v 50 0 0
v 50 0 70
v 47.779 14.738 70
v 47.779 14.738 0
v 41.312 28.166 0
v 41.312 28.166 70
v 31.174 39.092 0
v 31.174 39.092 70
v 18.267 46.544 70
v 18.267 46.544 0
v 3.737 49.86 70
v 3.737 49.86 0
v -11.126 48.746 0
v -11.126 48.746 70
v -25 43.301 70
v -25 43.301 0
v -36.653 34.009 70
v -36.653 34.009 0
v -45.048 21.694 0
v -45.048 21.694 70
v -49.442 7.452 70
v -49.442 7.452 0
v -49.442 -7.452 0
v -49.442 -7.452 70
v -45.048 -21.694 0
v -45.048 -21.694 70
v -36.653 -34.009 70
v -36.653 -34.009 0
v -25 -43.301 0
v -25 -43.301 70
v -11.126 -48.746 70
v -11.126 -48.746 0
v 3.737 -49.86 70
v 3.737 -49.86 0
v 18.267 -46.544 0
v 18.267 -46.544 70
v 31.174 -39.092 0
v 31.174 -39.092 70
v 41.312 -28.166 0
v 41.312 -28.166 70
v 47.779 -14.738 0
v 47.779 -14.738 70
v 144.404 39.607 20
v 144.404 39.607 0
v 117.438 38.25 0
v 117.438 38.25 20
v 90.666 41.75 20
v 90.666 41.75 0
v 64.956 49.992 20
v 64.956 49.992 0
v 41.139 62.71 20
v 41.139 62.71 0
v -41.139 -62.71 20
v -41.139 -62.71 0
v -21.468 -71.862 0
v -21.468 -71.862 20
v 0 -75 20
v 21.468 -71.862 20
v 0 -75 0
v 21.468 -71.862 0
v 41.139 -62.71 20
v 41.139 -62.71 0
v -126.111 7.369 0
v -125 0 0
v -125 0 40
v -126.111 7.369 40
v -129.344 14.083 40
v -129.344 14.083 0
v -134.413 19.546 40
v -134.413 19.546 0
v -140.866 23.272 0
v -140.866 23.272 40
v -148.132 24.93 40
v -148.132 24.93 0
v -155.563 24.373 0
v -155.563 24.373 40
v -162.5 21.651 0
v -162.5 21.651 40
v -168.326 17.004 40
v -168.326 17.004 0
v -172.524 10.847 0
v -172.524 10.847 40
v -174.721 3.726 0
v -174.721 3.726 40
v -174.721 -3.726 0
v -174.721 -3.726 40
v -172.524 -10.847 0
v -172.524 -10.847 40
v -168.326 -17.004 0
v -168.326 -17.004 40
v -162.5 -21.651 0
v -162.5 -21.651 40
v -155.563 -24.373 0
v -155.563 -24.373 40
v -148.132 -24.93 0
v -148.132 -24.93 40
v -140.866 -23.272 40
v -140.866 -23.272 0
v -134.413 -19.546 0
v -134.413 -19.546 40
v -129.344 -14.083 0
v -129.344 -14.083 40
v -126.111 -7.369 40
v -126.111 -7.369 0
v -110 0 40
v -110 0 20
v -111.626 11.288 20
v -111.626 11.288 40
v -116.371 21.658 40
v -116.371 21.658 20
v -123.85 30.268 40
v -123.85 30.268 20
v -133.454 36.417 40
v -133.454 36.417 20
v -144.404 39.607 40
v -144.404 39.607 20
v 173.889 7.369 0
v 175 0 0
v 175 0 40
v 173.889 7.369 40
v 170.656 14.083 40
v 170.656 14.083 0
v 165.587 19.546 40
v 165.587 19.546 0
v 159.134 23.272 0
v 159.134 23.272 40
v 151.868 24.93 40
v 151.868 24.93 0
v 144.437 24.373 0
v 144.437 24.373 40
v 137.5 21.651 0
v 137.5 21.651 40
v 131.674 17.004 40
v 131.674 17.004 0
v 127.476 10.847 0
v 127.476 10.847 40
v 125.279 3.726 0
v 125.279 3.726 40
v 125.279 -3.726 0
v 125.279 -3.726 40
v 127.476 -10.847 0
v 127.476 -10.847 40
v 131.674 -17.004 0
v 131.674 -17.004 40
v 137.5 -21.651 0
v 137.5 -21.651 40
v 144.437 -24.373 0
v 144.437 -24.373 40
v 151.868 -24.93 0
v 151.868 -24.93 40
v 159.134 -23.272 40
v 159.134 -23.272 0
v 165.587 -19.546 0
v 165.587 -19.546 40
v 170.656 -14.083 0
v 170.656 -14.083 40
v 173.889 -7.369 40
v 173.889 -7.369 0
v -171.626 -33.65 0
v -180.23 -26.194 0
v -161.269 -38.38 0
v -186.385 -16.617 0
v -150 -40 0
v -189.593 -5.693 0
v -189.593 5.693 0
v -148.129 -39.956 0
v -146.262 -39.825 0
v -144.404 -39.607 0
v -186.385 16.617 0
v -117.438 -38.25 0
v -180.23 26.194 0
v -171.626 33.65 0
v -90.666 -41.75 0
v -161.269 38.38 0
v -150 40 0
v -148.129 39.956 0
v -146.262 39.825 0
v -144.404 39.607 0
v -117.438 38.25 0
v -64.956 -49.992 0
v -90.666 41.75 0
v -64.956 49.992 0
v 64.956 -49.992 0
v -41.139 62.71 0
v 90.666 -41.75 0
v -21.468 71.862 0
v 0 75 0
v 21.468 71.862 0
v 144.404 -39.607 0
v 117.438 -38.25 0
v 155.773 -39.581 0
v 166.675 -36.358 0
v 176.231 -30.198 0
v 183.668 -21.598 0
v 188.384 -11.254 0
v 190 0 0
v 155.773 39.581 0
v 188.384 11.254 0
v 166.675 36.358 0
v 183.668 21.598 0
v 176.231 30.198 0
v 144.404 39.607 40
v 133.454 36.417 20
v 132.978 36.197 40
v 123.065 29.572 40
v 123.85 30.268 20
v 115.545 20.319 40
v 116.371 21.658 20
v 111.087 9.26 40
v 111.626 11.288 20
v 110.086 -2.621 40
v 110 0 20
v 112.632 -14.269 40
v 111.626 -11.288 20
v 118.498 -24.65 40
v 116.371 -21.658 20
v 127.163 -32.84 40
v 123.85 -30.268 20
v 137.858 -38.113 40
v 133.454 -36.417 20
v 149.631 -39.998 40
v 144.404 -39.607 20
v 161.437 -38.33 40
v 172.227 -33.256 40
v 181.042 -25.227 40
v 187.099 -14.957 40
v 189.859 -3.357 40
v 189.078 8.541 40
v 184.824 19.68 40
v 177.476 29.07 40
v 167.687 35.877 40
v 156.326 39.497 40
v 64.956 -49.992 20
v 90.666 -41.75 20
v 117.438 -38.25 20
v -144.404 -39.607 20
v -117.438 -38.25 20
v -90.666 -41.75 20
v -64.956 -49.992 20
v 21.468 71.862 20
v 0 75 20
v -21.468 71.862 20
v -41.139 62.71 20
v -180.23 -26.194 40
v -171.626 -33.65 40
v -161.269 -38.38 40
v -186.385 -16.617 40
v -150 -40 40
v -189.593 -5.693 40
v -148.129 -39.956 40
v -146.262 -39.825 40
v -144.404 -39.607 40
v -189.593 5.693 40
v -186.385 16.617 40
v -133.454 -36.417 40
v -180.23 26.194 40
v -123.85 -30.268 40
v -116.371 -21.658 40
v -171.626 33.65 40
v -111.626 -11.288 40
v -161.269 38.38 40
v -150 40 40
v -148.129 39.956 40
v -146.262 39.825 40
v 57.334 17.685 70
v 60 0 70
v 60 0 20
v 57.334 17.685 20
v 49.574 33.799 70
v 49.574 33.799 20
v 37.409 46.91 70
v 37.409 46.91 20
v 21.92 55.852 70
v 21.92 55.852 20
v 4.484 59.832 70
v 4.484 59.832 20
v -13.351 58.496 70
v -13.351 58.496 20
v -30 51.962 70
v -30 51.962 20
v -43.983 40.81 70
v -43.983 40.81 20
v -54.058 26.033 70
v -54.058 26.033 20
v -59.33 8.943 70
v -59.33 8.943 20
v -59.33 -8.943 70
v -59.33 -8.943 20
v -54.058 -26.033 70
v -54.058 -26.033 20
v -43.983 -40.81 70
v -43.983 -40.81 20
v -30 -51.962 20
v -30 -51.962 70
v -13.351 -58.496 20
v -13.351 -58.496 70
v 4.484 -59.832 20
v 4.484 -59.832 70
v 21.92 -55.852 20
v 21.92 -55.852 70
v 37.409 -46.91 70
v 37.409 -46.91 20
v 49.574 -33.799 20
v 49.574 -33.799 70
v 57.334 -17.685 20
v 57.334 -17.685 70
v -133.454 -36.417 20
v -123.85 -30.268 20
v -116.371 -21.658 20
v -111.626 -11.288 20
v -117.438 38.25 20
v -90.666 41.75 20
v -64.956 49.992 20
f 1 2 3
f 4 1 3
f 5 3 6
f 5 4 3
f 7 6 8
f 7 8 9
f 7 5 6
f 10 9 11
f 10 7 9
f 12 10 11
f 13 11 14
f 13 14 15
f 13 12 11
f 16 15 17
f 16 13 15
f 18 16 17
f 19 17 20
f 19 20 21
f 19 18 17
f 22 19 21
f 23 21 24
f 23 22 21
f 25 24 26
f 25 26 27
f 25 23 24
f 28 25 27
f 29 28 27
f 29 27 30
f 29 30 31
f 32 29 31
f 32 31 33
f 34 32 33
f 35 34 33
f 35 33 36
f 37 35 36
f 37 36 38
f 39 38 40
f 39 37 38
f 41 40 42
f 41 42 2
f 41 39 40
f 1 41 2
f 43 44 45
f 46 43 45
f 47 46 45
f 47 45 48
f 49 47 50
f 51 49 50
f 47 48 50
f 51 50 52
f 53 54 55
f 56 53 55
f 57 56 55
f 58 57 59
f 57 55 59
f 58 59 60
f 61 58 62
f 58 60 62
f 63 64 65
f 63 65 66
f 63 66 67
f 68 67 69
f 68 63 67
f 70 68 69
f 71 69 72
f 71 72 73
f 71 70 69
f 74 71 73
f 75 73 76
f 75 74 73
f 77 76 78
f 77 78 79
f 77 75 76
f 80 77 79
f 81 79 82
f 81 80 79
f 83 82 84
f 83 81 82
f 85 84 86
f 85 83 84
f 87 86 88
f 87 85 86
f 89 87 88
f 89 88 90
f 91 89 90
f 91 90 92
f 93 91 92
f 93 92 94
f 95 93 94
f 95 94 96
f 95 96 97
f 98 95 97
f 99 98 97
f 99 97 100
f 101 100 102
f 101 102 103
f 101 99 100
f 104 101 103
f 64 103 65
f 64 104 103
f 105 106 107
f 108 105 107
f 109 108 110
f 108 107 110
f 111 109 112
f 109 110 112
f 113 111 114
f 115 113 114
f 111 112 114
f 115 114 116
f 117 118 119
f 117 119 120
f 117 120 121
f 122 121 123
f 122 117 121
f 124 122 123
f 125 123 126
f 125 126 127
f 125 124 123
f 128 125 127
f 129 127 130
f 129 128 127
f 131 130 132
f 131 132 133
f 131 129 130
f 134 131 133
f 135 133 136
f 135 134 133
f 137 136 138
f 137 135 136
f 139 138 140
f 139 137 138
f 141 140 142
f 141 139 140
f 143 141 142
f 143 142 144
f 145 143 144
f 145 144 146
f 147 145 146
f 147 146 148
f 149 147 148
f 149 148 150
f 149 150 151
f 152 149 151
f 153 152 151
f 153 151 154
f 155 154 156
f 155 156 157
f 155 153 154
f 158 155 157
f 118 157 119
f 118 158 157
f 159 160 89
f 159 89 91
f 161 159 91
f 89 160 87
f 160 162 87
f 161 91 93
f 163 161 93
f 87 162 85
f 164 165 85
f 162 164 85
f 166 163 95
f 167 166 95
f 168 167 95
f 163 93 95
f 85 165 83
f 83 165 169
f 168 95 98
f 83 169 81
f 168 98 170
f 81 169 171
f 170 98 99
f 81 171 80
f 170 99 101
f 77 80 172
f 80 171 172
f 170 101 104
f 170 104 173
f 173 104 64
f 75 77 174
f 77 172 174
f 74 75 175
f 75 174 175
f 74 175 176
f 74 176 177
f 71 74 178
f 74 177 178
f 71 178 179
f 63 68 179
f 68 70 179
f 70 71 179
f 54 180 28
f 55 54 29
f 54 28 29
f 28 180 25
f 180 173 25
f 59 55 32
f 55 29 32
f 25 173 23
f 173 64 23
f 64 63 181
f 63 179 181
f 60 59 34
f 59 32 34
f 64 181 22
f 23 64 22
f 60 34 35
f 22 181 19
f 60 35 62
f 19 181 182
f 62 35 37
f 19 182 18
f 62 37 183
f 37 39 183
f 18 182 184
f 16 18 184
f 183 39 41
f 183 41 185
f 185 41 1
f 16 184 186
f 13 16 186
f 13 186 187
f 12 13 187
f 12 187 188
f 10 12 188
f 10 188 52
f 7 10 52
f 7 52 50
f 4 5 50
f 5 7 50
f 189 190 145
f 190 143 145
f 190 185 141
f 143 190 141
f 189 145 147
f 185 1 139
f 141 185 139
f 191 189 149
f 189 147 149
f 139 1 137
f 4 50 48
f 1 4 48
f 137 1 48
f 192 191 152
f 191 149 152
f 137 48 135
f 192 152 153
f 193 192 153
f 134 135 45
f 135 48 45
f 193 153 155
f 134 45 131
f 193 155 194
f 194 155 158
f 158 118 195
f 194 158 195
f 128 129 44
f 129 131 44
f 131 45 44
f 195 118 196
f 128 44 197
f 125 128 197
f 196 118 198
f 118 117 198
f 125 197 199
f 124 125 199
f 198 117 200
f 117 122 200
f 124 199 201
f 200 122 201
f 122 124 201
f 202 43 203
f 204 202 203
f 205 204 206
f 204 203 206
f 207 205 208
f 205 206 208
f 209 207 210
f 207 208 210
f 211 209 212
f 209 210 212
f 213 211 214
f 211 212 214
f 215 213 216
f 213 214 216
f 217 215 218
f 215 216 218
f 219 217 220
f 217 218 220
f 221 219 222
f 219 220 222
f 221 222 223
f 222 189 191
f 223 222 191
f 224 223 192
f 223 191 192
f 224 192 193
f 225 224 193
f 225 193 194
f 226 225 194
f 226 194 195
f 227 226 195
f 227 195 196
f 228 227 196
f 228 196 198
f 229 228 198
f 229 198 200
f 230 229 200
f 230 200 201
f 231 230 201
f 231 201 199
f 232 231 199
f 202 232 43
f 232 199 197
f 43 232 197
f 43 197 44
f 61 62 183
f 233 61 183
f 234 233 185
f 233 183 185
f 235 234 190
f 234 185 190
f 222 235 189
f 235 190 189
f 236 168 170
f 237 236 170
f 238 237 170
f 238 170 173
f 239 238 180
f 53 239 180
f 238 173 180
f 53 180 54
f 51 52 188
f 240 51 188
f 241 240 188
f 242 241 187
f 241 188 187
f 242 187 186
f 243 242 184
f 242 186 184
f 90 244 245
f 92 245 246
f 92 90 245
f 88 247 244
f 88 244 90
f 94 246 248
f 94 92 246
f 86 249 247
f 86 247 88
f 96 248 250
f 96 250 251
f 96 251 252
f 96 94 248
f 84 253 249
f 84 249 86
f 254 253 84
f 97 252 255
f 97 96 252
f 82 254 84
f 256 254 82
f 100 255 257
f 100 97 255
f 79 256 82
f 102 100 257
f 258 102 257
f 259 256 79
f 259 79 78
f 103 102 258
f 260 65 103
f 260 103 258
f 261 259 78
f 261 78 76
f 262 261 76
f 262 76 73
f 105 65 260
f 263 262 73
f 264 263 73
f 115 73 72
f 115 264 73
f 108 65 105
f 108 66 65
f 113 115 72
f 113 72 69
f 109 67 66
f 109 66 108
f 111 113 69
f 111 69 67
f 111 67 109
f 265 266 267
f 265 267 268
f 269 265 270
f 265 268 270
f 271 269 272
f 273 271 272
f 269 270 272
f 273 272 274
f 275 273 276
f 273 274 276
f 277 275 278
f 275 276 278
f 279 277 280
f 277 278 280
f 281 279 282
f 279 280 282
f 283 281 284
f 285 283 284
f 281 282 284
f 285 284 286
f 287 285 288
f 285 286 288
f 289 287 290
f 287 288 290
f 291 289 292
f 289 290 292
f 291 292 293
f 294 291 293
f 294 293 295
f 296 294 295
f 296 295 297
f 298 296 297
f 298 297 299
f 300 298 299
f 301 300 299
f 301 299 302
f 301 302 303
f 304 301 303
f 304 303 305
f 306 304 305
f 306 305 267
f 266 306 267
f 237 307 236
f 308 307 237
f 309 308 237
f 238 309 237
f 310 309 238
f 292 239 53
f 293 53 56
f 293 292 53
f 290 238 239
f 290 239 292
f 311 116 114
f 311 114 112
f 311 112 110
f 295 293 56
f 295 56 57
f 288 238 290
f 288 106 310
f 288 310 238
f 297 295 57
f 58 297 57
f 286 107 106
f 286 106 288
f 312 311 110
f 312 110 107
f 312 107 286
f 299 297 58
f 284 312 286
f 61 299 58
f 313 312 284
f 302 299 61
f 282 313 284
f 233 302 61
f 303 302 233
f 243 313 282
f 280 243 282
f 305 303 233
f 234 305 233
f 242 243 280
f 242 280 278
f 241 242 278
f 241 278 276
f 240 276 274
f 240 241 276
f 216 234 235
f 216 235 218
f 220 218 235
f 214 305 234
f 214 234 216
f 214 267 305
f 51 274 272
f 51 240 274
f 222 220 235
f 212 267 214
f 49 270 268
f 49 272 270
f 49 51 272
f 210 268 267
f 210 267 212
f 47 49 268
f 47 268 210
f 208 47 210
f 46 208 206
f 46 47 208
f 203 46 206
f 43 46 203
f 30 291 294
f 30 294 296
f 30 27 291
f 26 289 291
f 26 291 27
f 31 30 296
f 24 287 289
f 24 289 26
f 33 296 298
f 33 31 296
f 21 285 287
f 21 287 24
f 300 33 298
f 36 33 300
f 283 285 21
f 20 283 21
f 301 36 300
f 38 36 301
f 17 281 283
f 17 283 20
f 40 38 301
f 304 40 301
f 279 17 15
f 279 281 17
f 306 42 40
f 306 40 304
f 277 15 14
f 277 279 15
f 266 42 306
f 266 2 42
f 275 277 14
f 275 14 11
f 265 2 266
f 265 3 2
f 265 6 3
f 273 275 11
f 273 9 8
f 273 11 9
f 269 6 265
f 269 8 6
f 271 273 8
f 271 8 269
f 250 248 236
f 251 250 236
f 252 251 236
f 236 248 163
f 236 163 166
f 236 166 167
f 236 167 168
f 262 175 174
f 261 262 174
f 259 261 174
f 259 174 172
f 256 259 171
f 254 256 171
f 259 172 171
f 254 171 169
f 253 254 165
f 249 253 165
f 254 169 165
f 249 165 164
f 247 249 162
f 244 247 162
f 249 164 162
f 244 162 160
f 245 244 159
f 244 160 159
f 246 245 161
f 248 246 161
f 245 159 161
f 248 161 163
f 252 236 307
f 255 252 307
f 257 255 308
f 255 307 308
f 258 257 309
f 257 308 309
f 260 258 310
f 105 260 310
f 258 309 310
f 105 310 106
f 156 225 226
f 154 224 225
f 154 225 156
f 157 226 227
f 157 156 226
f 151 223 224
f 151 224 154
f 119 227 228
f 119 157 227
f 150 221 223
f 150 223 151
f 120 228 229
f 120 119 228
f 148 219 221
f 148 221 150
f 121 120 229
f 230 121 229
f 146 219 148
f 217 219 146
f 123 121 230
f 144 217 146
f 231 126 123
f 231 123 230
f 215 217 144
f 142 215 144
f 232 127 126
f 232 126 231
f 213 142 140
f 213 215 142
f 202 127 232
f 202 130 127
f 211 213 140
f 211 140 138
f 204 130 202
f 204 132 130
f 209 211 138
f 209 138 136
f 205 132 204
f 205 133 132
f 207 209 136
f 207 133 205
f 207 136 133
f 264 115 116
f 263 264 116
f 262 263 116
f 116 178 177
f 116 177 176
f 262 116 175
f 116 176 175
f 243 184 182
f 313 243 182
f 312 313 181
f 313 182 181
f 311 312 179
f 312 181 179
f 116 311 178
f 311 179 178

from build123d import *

# Parameters (mm, degrees)
SKETCH1_R           = 60
BOSS_EXTRUDE1_DEPTH = 20
SKETCH1_3_R         = 60
SKETCH1_3_R_2       = 50
BOSS_EXTRUDE2_DEPTH = 70
SKETCH1_5_R         = 40
SKETCH1_5_R_2       = 25
BOSS_EXTRUDE3_DEPTH = 40


with BuildPart() as part:
    # Sketch1 → Boss-Extrude1 (new body)
    with BuildSketch(Plane.XY):
        with BuildLine():
            ThreePointArc((-144.403508772, -39.606556098), (-90.666225841, -41.750102304), (-41.138888889, -62.710380488))
            ThreePointArc((-41.138888889, -62.710380488), (0, -75), (41.138888889, -62.710380488))
            ThreePointArc((41.138888889, -62.710380488), (90.666225841, -41.750102304), (144.403508772, -39.606556098))
            ThreePointArc((144.403508772, -39.606556098), (110, 0), (144.403508772, 39.606556098))
            ThreePointArc((144.403508772, 39.606556098), (90.666225841, 41.750102304), (41.138888889, 62.710380488))
            ThreePointArc((41.138888889, 62.710380488), (0, 75), (-41.138888889, 62.710380488))
            ThreePointArc((-41.138888889, 62.710380488), (-90.666225841, 41.750102304), (-144.403508772, 39.606556098))
            ThreePointArc((-144.403508772, 39.606556098), (-119.801824152, 26.23109177), (-110, 0))
            ThreePointArc((-110, 0), (-119.801824152, -26.23109177), (-144.403508772, -39.606556098))
        make_face()
        Circle(SKETCH1_R, mode=Mode.SUBTRACT)
    extrude(amount=BOSS_EXTRUDE1_DEPTH)

    # Sketch1<3> → Boss-Extrude2 (add)
    with BuildSketch(Plane.XY):
        Circle(SKETCH1_3_R)
        Circle(SKETCH1_3_R_2, mode=Mode.SUBTRACT)
    extrude(amount=BOSS_EXTRUDE2_DEPTH)

    # Sketch1<5> → Boss-Extrude3 (add)
    # profile 1 of 2: a face of its own
    with BuildSketch(Plane.XY):
        with Locations((-150, 0)):
            Circle(SKETCH1_5_R)
        with Locations((-150, 0)):
            Circle(SKETCH1_5_R_2, mode=Mode.SUBTRACT)
    # profile 2 of 2: a face of its own
    with BuildSketch(Plane.XY):
        with Locations((150, 0)):
            Circle(SKETCH1_5_R)
        with Locations((150, 0)):
            Circle(SKETCH1_5_R_2, mode=Mode.SUBTRACT)
    extrude(amount=BOSS_EXTRUDE3_DEPTH)


solid = part.part
